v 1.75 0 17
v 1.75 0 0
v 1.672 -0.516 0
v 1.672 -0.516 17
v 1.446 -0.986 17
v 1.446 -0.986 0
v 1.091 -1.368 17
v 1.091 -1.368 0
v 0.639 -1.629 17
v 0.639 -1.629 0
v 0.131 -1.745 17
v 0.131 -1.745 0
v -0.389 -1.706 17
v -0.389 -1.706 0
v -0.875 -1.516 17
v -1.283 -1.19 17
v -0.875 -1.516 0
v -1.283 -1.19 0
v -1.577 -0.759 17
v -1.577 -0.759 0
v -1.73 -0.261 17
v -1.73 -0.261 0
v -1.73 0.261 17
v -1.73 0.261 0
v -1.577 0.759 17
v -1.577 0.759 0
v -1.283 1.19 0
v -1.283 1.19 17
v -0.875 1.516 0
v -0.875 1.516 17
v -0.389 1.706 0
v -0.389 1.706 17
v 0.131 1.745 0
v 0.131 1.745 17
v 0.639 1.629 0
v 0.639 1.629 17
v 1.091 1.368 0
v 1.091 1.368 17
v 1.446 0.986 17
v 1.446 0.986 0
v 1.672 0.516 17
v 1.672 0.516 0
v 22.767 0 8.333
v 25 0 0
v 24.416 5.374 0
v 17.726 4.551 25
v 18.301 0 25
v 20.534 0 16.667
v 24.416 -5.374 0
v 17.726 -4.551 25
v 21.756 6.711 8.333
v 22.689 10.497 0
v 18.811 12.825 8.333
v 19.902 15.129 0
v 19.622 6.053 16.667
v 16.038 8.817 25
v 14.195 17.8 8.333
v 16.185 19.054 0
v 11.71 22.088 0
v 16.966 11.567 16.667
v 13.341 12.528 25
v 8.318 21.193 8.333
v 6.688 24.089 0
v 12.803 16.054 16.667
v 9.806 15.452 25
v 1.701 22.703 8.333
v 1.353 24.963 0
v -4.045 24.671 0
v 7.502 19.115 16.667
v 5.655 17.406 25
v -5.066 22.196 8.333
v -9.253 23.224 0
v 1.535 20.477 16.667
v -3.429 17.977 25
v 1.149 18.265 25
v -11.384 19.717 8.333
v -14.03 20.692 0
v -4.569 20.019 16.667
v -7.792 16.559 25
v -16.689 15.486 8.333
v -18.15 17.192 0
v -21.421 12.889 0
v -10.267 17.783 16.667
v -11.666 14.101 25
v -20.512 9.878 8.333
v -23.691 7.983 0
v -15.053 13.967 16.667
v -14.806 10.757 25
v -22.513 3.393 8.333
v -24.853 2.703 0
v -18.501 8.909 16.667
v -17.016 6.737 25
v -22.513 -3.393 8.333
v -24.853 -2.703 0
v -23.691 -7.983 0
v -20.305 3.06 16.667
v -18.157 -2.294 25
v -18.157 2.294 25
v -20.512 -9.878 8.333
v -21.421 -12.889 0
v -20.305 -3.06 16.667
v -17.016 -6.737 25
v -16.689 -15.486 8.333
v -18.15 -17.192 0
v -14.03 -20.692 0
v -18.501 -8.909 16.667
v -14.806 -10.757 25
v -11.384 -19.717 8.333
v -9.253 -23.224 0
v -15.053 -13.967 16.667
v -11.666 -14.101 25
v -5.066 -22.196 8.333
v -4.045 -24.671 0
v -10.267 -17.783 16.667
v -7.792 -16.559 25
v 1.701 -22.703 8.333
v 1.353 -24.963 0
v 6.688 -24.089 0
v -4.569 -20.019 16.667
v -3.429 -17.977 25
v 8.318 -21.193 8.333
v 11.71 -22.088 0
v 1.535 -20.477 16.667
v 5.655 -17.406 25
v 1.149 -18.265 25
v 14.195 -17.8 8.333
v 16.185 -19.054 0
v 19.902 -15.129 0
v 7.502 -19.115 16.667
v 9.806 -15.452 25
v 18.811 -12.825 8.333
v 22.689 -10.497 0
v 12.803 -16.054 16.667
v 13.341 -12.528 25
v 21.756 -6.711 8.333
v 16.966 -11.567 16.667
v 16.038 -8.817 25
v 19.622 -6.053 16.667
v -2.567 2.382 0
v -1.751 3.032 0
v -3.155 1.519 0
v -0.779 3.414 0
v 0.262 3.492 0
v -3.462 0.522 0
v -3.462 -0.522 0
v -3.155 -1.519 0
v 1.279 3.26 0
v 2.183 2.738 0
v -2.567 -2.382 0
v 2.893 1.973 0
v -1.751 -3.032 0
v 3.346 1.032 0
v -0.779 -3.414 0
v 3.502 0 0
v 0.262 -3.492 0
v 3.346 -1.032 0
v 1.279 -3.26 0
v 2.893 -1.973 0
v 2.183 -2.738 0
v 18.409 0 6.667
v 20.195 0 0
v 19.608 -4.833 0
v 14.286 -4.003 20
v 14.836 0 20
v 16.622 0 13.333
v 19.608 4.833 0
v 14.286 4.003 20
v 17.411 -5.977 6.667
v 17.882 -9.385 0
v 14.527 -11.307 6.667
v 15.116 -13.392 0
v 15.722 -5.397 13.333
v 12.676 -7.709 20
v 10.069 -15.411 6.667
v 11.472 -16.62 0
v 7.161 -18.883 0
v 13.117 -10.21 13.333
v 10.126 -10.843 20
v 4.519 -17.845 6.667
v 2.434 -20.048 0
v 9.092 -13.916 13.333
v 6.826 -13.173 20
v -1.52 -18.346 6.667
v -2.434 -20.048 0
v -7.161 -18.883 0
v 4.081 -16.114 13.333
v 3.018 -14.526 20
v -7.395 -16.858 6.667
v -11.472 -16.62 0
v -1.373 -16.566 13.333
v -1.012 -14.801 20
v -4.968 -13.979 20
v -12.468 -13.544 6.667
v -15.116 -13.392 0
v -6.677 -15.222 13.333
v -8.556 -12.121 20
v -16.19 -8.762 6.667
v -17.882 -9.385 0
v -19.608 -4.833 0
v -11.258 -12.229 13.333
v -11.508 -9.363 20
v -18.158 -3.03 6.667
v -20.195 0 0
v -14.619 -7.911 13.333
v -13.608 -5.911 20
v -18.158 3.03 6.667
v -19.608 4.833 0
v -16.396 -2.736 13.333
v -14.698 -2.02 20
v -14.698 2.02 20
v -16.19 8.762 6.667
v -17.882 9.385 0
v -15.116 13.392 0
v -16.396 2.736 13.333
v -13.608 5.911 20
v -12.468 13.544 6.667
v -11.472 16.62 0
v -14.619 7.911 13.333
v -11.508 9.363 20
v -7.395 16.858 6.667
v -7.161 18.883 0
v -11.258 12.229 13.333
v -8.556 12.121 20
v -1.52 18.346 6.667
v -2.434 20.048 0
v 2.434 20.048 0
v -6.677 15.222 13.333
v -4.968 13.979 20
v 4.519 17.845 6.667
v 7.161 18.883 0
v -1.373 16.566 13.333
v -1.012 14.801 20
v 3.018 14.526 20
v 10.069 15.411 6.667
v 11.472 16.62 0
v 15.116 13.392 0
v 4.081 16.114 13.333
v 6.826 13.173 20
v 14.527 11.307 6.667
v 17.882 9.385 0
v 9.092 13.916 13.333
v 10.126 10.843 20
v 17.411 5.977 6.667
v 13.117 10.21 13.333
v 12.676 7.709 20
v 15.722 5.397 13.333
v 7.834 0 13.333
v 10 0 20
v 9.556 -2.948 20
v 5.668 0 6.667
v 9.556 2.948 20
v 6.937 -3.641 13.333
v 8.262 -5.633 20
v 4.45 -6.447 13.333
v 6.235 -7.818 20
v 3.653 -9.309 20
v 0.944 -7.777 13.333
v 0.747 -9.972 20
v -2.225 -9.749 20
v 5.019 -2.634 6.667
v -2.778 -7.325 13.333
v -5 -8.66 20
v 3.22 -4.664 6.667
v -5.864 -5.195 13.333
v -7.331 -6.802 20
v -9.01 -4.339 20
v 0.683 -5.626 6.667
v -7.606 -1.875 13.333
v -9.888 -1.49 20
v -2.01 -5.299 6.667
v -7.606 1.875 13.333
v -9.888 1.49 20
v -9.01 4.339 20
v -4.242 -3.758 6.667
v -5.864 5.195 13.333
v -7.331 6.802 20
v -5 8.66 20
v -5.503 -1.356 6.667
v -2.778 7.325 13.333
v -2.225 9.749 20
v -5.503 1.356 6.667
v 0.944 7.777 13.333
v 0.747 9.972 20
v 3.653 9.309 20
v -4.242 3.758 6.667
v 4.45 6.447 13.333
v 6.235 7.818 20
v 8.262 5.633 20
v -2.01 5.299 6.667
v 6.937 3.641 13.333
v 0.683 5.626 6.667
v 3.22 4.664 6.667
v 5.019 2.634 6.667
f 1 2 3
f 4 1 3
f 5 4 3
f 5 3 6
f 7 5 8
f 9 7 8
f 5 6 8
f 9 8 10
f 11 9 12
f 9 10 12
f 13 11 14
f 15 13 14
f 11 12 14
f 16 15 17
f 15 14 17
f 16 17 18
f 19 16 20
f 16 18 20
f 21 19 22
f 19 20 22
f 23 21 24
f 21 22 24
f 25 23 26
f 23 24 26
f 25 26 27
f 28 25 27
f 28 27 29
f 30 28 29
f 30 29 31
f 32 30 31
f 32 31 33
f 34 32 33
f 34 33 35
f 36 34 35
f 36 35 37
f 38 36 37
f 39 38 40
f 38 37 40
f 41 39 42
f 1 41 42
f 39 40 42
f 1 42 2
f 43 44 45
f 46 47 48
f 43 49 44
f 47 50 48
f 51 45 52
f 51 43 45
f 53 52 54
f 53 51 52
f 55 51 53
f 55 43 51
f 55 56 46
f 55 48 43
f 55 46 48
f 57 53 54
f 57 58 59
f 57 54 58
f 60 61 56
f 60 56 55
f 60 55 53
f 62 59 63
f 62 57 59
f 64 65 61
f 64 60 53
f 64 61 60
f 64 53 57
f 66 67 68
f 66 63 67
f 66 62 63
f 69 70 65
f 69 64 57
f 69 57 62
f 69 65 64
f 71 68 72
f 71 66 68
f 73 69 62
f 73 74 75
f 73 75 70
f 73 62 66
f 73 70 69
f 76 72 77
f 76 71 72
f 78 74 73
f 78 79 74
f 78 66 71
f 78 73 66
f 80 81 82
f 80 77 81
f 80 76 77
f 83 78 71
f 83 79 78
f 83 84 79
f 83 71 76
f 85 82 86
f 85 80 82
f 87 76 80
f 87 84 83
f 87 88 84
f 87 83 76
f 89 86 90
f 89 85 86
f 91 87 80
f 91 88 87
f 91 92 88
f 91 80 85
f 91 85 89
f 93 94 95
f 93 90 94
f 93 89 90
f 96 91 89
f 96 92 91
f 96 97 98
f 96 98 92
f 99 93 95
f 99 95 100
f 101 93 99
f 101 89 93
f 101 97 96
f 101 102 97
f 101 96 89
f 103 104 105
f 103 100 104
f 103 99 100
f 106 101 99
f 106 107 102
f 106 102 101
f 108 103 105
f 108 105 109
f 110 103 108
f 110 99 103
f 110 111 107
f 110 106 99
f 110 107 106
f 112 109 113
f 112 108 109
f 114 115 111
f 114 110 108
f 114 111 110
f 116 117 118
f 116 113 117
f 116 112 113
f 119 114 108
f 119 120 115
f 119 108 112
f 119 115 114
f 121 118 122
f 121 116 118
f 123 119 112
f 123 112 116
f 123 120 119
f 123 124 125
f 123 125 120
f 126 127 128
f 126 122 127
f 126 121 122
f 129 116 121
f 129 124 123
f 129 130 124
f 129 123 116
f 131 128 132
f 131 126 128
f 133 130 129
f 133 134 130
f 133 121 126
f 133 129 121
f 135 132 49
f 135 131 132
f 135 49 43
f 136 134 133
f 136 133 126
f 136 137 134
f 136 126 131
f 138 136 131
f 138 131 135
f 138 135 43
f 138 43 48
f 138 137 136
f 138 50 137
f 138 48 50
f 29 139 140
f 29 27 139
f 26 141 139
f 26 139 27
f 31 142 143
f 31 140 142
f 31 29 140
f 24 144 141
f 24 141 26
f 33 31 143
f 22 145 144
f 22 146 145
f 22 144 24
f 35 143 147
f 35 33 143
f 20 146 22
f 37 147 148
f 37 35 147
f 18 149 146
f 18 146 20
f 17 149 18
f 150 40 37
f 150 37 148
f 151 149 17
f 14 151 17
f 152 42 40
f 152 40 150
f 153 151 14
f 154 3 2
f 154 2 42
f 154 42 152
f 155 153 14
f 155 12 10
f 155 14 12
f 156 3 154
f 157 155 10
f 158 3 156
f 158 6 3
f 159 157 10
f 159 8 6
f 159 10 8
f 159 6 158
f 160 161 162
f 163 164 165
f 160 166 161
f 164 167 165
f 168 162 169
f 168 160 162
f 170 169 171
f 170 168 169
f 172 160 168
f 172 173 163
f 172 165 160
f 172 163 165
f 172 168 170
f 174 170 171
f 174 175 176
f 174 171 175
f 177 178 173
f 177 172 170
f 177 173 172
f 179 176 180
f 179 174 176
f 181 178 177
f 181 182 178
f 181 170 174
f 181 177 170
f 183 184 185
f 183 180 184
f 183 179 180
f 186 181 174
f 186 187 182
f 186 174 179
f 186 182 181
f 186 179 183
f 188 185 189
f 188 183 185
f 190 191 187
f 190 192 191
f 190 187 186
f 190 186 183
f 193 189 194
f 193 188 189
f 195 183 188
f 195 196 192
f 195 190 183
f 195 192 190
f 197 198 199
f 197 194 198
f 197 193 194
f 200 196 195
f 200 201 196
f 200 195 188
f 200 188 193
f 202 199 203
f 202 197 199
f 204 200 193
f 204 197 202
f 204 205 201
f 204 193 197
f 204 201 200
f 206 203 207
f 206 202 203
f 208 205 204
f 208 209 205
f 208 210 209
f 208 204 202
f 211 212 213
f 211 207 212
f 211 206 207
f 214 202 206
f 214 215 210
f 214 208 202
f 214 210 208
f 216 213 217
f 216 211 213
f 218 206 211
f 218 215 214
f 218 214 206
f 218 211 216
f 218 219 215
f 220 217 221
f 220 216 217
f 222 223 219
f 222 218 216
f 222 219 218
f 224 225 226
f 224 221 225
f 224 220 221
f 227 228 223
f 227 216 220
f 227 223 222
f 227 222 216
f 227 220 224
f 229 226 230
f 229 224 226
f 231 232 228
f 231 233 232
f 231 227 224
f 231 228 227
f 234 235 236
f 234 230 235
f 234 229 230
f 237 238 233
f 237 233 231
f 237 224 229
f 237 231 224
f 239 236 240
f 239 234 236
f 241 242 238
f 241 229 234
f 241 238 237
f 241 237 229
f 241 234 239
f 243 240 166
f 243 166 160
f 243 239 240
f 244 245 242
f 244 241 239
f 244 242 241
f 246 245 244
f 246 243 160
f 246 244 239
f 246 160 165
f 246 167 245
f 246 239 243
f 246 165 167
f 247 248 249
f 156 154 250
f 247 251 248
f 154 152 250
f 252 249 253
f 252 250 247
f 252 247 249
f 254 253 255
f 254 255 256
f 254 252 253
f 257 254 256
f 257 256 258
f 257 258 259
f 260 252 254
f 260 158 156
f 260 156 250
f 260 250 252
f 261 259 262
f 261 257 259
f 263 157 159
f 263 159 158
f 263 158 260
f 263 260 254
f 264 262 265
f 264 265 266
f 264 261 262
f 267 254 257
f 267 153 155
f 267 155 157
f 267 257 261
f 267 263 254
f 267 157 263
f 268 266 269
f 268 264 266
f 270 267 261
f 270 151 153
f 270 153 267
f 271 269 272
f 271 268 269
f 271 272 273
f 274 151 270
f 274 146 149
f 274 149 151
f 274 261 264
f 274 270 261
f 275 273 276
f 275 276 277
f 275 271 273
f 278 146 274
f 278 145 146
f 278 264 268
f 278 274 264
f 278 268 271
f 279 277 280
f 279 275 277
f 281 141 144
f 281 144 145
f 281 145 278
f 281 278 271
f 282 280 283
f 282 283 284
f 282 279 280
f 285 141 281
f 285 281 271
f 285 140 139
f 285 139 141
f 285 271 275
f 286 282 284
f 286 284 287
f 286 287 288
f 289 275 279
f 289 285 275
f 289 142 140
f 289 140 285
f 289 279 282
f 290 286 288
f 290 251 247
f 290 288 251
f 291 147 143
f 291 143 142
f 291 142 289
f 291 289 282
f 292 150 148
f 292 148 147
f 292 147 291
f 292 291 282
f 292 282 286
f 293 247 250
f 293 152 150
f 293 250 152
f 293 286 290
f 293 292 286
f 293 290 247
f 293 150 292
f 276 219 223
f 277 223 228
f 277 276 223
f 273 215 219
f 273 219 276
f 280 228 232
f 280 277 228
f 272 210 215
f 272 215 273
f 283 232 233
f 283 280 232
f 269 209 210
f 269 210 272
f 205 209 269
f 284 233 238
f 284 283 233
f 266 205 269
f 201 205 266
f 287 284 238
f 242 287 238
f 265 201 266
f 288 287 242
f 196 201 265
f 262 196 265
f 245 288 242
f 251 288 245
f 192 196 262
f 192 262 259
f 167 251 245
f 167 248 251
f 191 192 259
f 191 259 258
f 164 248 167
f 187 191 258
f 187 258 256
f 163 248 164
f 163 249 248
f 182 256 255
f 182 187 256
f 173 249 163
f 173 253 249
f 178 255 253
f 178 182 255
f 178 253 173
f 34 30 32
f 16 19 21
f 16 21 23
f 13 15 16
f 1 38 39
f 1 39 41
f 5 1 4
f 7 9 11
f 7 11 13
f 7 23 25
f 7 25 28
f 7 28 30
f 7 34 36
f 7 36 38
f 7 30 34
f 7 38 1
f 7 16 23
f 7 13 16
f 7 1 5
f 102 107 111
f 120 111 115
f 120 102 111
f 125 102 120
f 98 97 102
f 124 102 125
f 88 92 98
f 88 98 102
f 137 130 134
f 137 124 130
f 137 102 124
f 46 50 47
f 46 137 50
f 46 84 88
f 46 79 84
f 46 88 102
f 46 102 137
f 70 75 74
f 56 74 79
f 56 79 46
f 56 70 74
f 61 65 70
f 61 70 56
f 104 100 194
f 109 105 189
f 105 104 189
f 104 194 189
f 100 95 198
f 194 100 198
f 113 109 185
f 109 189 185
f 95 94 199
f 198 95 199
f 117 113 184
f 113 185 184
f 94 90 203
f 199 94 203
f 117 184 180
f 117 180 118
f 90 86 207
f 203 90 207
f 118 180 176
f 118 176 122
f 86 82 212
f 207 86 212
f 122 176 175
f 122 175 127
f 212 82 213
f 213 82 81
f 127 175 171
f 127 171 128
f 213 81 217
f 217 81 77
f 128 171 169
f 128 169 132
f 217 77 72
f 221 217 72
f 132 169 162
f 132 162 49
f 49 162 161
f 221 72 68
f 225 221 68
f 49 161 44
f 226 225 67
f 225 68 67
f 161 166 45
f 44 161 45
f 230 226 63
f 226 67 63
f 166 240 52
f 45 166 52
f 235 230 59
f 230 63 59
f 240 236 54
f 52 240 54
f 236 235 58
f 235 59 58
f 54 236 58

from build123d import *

# Parameters (mm, degrees)
SKETCH_R        = 25
PAD_DEPTH       = 25
PAD_TAPER       = 15
SKETCH001_R     = 20.195
POCKET_DEPTH    = 20
POCKET_TAPER    = 15
SKETCH002_R     = 10
PAD001_DEPTH    = 20
PAD001_TAPER    = 18
SKETCH003_R     = 1.75
POCKET001_DEPTH = 17


with BuildPart() as part:
    # Sketch → Pad (new body)
    with BuildSketch(Plane.XY):
        Circle(SKETCH_R)
    extrude(amount=PAD_DEPTH, taper=PAD_TAPER)

    # Sketch001 (on Face2 of Pad) → Pocket (cut)
    with BuildSketch(Plane(origin=(0, 0, 0), x_dir=(1, 0, 0), z_dir=(0, 0, -1))):
        Circle(SKETCH001_R)
    extrude(amount=-POCKET_DEPTH, taper=POCKET_TAPER, mode=Mode.SUBTRACT)

    # Sketch002 (on Face5 of Pocket) → Pad001 (join)
    with BuildSketch(Plane(origin=(0, 0, 20), x_dir=(1, 0, 0), z_dir=(0, 0, -1))):
        Circle(SKETCH002_R)
    extrude(amount=PAD001_DEPTH, taper=PAD001_TAPER)

    # Sketch003 (on Face7 of Pad001) → Pocket001 (cut)
    with BuildSketch(Plane(origin=(0, 0, 0), x_dir=(1, 0, 0), z_dir=(0, 0, -1))):
        Circle(SKETCH003_R)
    extrude(amount=-POCKET001_DEPTH, mode=Mode.SUBTRACT)


solid = part.part
